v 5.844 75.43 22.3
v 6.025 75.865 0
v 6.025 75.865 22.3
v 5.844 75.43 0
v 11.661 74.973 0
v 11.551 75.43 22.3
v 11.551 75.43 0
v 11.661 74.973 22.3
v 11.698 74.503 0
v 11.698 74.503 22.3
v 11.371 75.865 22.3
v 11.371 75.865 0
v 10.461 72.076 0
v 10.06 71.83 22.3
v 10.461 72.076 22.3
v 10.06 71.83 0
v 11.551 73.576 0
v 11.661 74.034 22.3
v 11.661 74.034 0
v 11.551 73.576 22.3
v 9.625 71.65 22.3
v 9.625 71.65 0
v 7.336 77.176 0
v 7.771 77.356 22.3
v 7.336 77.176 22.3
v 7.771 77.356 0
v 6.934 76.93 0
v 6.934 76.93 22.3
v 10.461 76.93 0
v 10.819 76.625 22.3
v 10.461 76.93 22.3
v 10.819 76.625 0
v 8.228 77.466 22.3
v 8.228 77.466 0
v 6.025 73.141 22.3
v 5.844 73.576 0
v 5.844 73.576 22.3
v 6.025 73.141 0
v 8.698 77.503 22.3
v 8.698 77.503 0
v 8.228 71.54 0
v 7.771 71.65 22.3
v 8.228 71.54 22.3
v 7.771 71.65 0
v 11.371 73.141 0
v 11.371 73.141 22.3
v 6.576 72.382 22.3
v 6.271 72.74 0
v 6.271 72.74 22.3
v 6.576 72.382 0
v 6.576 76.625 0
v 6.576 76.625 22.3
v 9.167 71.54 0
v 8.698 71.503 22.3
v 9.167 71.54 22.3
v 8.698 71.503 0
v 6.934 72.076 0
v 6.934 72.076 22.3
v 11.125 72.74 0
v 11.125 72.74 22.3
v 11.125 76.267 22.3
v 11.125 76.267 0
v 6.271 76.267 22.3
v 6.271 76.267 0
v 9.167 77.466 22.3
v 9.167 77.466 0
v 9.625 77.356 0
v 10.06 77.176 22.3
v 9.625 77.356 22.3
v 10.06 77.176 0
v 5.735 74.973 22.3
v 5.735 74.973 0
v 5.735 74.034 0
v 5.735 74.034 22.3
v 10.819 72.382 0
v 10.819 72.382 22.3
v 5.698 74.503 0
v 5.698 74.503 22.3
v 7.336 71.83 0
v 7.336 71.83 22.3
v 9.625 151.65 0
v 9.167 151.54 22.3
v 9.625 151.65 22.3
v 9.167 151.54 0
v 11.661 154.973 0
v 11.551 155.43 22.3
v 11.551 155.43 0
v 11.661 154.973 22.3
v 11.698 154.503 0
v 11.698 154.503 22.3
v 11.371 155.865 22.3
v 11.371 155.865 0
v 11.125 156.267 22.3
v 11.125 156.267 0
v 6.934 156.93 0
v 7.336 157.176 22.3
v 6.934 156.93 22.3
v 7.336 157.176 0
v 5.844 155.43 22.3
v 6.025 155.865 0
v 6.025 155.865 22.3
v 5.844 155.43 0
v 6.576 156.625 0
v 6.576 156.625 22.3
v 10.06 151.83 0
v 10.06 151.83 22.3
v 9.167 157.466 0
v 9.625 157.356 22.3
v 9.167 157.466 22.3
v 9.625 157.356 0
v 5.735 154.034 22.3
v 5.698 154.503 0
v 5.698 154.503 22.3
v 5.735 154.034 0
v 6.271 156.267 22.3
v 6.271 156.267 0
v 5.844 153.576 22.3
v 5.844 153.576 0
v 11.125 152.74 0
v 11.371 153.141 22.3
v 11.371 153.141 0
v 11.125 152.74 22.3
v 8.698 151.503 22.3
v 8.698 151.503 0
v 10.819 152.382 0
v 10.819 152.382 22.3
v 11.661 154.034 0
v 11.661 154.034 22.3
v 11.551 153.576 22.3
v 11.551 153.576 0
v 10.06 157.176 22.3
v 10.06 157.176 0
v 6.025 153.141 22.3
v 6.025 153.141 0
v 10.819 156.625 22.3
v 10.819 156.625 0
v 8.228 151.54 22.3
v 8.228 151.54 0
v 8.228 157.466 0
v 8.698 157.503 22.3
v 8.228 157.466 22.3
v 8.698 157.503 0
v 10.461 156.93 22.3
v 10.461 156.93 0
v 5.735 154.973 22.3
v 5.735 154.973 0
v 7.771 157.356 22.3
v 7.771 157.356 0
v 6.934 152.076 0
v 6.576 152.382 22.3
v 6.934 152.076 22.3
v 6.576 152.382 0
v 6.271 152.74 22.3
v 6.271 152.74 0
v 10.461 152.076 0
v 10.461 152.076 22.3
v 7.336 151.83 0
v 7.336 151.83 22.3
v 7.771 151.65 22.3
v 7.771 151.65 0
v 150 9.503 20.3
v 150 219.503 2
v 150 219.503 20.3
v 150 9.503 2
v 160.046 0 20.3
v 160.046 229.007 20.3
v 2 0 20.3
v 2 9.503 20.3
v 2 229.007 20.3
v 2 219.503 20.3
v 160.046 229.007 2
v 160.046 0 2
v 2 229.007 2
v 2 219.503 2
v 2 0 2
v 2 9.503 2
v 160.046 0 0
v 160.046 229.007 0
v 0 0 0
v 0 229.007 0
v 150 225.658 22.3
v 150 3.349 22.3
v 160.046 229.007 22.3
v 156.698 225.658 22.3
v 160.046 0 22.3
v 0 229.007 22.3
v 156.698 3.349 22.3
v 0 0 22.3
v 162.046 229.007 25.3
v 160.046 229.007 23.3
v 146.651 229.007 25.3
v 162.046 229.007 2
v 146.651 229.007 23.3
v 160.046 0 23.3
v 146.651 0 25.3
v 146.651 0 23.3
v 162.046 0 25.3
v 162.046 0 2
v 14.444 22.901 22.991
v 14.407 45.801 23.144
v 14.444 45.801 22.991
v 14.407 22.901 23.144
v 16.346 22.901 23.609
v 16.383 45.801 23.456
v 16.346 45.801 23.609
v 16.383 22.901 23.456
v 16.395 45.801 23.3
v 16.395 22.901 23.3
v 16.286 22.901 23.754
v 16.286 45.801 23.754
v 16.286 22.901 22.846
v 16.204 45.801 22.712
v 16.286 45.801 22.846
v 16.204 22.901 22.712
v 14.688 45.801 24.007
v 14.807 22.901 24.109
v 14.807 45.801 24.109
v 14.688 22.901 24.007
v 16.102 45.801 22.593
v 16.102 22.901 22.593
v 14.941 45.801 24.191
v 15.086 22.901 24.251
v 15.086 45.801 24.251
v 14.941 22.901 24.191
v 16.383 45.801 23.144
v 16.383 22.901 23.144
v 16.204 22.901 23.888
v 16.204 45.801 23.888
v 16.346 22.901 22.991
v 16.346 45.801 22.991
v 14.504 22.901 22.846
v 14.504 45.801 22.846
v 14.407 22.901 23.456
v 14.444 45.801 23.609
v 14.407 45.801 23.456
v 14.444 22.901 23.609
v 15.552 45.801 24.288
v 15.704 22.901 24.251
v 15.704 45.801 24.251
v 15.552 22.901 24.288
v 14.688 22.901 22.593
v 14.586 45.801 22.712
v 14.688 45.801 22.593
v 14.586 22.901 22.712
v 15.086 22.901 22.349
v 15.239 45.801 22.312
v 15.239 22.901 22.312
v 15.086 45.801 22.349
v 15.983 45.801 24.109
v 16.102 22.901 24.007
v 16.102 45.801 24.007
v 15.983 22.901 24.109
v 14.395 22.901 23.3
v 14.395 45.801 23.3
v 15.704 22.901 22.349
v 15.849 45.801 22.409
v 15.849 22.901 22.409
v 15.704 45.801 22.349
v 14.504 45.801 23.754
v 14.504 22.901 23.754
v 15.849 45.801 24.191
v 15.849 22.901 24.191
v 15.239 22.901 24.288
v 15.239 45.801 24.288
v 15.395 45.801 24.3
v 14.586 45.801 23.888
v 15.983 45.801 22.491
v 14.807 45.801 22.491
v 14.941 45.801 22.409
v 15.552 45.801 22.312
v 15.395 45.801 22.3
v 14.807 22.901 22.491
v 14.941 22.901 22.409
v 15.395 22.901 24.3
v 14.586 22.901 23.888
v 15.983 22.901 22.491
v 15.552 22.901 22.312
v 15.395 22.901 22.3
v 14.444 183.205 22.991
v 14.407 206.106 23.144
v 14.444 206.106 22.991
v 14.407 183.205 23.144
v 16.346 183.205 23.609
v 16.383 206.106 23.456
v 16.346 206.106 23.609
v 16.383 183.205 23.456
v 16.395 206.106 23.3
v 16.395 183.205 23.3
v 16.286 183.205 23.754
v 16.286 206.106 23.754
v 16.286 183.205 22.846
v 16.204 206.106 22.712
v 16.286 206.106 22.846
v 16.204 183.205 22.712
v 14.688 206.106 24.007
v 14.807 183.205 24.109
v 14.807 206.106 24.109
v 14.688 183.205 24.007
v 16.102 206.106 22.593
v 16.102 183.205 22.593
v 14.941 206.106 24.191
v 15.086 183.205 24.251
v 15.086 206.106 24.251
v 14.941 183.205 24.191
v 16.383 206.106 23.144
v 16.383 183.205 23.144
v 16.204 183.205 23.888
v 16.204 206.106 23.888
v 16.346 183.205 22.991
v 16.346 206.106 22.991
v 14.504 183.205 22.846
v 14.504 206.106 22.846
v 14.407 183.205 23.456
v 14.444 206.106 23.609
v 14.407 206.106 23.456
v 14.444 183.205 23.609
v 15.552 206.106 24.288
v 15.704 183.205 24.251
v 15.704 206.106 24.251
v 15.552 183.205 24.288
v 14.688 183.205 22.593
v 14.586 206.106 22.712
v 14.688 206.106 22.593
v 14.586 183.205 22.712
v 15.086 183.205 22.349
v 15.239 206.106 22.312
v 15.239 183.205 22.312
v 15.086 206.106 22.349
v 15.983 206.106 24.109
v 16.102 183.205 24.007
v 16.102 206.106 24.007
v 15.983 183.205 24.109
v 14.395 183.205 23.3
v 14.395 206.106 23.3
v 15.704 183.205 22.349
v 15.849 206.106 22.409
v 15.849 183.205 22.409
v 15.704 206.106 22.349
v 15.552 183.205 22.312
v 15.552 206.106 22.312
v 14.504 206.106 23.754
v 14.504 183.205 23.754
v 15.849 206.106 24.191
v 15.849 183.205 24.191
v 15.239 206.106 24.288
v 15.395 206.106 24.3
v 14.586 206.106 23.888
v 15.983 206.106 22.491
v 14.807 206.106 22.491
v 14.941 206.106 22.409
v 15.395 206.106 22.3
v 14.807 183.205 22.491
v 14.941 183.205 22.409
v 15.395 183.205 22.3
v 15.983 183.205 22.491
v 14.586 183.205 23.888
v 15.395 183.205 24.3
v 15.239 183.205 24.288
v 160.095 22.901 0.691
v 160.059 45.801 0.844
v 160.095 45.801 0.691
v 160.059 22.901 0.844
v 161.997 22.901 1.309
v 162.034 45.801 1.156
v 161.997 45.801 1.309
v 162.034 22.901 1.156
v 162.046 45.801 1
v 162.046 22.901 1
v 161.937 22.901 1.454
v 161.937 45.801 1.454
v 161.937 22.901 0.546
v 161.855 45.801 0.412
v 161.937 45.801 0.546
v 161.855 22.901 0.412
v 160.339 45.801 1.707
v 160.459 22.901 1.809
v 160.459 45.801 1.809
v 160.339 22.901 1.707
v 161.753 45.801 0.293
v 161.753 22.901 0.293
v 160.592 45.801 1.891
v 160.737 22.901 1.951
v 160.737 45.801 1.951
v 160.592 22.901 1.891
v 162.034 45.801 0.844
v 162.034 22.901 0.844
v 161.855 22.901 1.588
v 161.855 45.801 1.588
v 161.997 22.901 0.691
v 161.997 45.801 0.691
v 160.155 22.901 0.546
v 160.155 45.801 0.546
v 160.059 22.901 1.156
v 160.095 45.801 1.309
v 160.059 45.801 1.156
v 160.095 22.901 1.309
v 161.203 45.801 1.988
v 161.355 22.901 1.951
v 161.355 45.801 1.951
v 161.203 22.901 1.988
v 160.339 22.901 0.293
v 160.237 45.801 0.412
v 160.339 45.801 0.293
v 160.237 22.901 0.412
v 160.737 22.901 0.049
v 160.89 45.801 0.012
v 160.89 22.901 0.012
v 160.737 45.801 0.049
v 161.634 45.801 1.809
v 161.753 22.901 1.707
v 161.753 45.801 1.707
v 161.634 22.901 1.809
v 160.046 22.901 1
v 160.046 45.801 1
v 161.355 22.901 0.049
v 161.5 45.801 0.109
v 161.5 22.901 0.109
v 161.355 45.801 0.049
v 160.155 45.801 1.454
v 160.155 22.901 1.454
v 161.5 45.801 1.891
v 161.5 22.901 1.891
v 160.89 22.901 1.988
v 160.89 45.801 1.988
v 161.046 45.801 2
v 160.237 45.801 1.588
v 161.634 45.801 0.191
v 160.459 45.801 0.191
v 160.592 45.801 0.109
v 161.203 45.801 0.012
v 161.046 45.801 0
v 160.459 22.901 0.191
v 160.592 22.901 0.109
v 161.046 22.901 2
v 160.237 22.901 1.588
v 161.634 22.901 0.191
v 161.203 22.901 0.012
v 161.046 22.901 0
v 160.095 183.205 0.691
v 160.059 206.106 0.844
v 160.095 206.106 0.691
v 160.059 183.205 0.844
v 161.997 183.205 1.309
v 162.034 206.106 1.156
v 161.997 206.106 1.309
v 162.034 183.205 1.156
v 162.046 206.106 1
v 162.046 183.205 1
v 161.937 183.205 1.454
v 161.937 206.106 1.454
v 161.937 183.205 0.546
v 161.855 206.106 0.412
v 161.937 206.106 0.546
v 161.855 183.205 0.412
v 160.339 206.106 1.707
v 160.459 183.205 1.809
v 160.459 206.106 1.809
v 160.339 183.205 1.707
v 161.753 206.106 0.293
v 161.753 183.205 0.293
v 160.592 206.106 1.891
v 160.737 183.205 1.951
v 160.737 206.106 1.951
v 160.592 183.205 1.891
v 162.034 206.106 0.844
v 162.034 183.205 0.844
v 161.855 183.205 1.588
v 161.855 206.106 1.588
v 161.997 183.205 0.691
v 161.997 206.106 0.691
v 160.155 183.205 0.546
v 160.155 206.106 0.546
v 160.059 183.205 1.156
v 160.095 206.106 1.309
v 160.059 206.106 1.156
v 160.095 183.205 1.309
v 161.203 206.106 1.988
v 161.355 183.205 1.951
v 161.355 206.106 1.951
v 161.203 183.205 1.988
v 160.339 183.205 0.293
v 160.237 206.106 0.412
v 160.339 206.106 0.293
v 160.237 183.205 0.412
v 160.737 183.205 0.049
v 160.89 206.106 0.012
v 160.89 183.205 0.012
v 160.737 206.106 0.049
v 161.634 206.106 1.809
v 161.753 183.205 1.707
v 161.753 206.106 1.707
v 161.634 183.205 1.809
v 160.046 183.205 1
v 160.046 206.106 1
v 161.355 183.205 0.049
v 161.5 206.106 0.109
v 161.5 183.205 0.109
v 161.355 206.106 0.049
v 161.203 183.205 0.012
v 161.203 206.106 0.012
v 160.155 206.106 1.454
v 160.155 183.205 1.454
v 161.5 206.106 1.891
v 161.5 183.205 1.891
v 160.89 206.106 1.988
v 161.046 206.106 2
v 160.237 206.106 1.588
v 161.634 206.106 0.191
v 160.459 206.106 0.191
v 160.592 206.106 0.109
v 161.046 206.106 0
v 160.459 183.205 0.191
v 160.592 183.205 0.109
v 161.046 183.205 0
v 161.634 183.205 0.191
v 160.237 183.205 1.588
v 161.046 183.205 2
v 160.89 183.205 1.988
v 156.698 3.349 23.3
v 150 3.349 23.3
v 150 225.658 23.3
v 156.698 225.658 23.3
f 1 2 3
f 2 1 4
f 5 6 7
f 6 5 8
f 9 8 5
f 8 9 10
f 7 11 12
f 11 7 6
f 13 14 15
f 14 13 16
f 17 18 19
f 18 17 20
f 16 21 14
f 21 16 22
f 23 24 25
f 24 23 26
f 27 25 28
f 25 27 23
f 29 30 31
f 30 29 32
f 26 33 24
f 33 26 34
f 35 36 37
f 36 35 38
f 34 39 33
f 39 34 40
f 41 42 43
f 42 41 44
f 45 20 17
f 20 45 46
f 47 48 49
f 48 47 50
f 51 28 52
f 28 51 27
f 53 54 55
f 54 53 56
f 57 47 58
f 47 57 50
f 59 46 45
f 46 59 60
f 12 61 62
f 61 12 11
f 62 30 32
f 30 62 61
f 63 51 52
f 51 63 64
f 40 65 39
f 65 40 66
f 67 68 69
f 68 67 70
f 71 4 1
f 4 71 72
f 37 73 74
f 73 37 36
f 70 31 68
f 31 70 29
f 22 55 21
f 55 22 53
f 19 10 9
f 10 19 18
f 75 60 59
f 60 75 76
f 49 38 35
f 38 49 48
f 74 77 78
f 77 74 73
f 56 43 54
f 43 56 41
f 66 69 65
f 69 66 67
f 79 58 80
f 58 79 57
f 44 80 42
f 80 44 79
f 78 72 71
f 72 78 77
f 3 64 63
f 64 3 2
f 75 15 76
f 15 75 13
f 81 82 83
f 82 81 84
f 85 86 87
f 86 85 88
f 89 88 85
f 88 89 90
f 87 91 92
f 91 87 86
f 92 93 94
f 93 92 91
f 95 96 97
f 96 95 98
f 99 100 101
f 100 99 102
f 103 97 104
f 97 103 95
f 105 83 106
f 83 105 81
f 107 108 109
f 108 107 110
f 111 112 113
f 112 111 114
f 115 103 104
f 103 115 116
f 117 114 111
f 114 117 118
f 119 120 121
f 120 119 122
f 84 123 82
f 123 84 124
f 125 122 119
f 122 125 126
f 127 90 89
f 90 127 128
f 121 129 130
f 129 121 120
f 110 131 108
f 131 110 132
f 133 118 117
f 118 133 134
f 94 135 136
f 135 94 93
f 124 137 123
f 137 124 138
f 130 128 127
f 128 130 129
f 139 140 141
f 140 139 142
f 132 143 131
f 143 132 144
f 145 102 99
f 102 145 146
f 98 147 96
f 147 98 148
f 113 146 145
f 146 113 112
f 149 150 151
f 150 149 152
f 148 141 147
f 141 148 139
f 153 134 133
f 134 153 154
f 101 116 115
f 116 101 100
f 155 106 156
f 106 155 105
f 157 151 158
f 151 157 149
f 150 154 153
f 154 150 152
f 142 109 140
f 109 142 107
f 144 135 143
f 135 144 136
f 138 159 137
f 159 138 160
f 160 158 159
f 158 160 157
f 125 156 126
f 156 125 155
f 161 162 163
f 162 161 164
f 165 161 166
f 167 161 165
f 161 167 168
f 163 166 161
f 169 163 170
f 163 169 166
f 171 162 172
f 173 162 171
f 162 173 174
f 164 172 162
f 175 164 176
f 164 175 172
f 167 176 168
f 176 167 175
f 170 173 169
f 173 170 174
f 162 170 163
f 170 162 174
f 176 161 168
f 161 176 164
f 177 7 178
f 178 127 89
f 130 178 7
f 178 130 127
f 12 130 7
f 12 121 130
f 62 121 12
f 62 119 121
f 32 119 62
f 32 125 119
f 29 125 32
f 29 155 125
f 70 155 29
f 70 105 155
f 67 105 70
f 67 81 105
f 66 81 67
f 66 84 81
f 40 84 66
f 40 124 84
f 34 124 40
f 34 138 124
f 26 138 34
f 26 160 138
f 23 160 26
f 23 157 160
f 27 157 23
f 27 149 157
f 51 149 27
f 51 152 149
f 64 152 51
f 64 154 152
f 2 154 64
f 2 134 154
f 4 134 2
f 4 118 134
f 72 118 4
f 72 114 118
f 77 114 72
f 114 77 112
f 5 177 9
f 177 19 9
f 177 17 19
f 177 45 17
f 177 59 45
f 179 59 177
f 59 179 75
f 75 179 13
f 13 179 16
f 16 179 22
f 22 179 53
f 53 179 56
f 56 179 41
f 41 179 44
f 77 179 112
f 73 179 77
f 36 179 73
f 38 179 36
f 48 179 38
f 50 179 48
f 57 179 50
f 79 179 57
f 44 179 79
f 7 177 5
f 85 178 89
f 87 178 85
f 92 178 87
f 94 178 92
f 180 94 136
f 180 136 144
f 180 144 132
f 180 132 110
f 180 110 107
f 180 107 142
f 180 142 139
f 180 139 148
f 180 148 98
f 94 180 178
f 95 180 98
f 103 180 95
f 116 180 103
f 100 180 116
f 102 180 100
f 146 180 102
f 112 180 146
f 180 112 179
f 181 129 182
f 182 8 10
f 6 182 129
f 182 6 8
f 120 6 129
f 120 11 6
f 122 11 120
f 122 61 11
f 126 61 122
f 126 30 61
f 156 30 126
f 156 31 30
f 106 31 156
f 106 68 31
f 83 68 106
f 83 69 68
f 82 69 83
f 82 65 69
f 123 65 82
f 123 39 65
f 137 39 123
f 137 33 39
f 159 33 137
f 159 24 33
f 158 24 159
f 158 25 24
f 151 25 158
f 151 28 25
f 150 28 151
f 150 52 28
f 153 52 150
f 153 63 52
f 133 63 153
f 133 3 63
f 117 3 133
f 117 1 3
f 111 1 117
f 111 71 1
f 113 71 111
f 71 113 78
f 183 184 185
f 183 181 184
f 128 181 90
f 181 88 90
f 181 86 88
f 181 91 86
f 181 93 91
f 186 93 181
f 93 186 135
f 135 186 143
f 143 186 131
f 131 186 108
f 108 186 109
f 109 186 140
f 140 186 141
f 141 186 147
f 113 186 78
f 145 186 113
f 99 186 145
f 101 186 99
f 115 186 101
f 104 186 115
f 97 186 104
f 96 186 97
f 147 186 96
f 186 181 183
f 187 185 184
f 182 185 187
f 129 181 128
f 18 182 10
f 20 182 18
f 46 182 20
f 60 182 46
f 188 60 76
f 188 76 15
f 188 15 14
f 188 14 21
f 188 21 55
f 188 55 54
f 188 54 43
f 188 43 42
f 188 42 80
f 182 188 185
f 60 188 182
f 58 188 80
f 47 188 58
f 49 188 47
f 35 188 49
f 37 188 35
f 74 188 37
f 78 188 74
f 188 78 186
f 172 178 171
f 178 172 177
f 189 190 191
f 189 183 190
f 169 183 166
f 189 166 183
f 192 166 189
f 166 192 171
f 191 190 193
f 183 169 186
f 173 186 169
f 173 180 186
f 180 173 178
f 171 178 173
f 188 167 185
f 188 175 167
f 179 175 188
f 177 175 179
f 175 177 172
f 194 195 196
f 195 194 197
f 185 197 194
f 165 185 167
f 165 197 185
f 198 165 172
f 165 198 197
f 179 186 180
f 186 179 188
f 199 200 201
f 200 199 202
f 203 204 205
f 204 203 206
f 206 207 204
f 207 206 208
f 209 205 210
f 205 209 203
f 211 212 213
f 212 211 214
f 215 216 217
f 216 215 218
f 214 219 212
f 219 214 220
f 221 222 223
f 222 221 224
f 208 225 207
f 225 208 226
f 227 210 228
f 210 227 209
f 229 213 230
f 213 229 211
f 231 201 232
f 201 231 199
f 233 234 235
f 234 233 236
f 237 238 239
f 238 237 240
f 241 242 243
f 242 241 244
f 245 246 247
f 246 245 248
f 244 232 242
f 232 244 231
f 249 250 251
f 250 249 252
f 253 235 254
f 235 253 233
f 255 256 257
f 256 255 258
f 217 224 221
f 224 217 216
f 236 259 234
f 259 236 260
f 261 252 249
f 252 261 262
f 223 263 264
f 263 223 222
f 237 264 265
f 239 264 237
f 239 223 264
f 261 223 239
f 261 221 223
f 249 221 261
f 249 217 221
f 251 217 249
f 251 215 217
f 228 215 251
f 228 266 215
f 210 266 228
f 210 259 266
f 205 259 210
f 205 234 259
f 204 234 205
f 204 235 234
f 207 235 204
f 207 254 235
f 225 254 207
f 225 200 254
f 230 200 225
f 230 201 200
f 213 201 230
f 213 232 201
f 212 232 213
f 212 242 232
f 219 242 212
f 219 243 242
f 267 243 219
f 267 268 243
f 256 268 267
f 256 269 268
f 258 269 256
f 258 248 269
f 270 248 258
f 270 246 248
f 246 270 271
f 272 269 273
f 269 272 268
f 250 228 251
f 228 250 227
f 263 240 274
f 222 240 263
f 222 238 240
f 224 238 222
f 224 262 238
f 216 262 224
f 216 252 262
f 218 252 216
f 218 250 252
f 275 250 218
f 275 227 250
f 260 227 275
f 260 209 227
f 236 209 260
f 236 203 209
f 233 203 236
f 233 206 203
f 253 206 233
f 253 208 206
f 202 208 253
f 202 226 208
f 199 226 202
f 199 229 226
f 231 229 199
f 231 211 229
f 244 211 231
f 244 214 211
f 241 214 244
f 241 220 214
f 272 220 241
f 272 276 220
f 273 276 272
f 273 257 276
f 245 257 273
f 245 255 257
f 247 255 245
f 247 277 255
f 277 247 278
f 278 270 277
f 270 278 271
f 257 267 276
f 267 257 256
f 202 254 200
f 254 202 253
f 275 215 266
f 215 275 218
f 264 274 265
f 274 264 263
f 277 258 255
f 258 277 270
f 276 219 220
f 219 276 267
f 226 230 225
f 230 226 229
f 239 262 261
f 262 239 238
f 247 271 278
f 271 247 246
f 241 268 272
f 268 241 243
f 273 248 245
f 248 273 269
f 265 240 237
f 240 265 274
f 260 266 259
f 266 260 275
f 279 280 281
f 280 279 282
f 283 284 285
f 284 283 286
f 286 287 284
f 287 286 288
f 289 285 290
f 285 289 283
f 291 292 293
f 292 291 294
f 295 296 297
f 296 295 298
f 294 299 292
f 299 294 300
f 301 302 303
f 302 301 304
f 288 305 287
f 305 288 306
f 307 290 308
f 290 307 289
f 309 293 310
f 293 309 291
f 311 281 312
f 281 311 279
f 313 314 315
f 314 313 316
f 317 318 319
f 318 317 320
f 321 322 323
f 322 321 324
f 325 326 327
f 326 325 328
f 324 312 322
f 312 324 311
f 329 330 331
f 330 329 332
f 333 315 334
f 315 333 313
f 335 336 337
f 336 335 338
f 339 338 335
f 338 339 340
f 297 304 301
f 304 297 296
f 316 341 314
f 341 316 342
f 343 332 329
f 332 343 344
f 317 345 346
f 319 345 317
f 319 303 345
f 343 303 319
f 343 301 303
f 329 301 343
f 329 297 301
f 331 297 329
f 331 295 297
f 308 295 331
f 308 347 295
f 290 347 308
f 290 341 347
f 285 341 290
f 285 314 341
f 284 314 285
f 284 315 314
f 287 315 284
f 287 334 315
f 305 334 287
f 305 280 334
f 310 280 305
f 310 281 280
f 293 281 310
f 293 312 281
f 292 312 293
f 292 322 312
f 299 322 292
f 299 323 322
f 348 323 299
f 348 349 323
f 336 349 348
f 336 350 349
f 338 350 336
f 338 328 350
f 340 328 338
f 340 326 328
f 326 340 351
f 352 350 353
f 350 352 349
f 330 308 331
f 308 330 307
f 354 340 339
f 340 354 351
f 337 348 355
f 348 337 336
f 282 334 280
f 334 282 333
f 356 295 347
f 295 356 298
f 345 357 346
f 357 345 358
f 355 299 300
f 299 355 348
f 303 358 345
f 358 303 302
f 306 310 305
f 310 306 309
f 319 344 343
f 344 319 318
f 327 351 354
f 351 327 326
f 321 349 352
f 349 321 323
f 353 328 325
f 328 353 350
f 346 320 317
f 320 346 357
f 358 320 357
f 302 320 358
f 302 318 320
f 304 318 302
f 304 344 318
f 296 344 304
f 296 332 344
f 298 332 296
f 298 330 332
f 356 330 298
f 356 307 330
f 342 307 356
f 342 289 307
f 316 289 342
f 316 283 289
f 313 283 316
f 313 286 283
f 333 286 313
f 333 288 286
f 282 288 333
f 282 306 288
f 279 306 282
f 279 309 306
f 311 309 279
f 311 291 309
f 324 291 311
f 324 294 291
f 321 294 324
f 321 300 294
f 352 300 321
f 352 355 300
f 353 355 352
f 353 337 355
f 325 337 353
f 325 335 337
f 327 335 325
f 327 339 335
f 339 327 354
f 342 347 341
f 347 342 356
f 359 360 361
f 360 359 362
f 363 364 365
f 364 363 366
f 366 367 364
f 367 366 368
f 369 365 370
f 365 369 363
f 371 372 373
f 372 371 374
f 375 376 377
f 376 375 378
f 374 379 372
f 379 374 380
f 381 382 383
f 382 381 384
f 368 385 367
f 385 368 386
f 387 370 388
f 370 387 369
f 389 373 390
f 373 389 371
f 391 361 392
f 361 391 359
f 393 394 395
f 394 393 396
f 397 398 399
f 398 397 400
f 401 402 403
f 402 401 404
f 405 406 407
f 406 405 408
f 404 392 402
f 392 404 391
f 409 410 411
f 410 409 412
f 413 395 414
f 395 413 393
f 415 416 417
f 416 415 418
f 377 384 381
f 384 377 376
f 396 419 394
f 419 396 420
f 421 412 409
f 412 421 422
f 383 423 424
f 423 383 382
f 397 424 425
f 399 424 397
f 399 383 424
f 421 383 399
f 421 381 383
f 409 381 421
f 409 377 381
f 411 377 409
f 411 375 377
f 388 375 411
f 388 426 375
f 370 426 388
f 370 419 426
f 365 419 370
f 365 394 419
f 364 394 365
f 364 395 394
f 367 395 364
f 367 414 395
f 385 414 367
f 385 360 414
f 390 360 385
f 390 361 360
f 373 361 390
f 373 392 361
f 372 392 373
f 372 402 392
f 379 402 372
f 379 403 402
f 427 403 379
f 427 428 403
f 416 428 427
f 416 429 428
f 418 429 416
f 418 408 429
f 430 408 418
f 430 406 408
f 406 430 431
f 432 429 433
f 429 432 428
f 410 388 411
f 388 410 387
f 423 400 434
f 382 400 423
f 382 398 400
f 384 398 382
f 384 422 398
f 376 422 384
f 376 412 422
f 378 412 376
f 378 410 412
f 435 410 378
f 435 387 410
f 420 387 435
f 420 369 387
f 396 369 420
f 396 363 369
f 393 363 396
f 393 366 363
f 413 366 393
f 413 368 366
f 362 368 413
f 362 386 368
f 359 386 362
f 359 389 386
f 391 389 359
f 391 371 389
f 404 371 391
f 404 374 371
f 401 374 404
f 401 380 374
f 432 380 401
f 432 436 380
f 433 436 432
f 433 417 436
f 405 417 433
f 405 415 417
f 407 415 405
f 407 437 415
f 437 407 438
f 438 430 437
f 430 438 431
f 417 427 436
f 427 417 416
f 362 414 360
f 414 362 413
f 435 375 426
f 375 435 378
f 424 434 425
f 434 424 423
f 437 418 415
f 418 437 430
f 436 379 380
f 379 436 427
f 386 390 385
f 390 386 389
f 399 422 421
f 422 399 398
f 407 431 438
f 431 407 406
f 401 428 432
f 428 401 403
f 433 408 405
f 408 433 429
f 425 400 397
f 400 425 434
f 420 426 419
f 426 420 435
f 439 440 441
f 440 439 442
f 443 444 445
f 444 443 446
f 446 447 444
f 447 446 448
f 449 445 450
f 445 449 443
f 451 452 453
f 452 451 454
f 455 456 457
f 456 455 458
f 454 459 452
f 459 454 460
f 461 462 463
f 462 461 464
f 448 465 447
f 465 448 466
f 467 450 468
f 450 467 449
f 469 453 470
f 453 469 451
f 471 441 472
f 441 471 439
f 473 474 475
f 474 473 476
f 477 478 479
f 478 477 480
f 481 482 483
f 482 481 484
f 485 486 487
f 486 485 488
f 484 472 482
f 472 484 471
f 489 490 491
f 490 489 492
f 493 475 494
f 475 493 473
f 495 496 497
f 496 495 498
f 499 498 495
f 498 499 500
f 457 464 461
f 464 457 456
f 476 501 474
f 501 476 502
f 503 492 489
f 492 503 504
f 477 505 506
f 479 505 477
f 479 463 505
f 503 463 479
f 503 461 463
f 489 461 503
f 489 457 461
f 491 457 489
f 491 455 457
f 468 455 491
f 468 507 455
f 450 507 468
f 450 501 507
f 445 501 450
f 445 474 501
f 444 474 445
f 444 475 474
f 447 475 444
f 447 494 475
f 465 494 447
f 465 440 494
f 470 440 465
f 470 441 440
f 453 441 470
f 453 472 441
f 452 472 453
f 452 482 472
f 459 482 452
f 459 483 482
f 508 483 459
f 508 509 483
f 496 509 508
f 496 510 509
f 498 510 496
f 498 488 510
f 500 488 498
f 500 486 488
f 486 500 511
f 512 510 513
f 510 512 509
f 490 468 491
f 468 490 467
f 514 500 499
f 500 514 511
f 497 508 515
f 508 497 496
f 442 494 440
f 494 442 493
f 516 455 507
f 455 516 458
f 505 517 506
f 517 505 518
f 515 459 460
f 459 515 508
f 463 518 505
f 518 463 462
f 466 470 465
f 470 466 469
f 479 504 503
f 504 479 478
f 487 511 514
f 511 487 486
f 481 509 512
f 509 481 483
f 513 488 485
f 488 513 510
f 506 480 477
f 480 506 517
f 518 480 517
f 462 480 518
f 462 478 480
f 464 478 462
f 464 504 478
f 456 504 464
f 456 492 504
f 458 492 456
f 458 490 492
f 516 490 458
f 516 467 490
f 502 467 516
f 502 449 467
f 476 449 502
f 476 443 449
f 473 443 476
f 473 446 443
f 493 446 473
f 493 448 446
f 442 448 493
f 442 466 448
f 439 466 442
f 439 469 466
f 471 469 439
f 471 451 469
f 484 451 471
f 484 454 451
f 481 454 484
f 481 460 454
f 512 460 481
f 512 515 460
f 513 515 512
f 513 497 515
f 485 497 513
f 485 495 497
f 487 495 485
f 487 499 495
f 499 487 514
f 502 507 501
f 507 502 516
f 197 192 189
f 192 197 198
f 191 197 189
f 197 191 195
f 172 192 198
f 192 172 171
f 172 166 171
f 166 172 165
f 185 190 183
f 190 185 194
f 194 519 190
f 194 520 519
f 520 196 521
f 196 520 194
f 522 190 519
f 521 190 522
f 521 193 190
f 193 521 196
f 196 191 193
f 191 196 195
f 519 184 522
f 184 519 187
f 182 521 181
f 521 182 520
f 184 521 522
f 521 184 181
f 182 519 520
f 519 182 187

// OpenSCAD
// Configuration (all sizes in millimeters)
metal_thickness = 2;
magnet_thickness = 1;

// A5 paper default
paper_width = 148;
paper_height = 210;
paper_sheet_thickness = 0.1;
paper_sheets = ceil(365 / 2); // One page per day default

paper_hole_positions = [0, 80];
paper_hole_center = 40; // max(paper_hole_positions) / 2
paper_hole_radius = 3;

facets = 40; // Number of facets in circular objects
explode = false; // Set to true to see parts separately
// Configuration end

// Calculate Cn size based on arithmetic progression
// https://secure.wikimedia.org/wikipedia/en/wiki/ISO_216
outer_width = paper_width * pow(2, 1.0 / 8);
outer_height = paper_height * pow(2, 1.0 / 8);

paper_thickness = paper_sheets * paper_sheet_thickness;

back_thickness = 2 * metal_thickness + paper_thickness;

margin_width = (outer_width - paper_width) / 2;
margin_height = (outer_height - paper_height) / 2;

overhang_width = margin_width * 2;

// There's no need for left margin on the back and front
back_width = outer_width - margin_width / 2;

// The front is to the right of the overhang from the back
front_width = back_width - overhang_width;

magnet_margin = overhang_width / 4;
magnet_width = overhang_width - 2 * magnet_margin;
magnet_height = outer_height - 2 * magnet_margin;

hinge_height = outer_height / 10;
hinge_radius = metal_thickness / 2;

// Some useful information for constructing by hand
echo (str(
	"Book outer dimensions: ",
	"width=", outer_width, ", ",
	"height=", outer_height, ", ",
	"thickness=", back_thickness + 2*magnet_thickness,
	" (not counting hinges)"));

echo (str(
	"Center length of the back plate sections: ",
	back_width + metal_thickness / 2, ", ",
	back_thickness - metal_thickness, ", ",
	overhang_width + metal_thickness / 2));
echo (str(
	"Total length of the back plate sections: ",
	back_width + metal_thickness / 2 +
	back_thickness - metal_thickness +
	overhang_width + metal_thickness / 2));

echo (str(
	"Width of the front plate: ",
	front_width));

echo (str(
	"Center length of the clasp sections: ",
	back_thickness + magnet_thickness - metal_thickness / 2, ", ",
	overhang_width - metal_thickness / 2));

echo (str(
	"Total length of the clasp sections: ",
	back_thickness + magnet_thickness - metal_thickness / 2 +
	overhang_width - metal_thickness / 2));

module paper() {
	difference() {
		translate([metal_thickness, margin_height, metal_thickness]) {
			cube(size = [paper_width, paper_height, paper_thickness]);
		}
		binding_holes();
	}
}

module back_cover() {
	translate([metal_thickness, 0, 0]) {
		cube(size = [back_width, outer_height, metal_thickness]);
	}
}

module back_side() {
	cube(size = [metal_thickness, outer_height, back_thickness]);
}

module back_overhang() {
	translate([metal_thickness, 0, paper_thickness + metal_thickness]) {
		cube(size = [overhang_width, outer_height, metal_thickness]);
	}
}

module binding_hole() {
	cylinder(h = back_thickness, r=paper_hole_radius, $fn=facets);
}

module binding_holes() {
	translate([metal_thickness + overhang_width / 2, outer_height / 2 - paper_hole_center, 0]) {
		for (position = paper_hole_positions) {
			translate([0, position, 0]) {
				binding_hole();
			}
			echo (str(
				"Binding hole center distance from bottom: ",
				outer_height / 2 - paper_hole_center + position + paper_hole_radius));
		}
	}
}

module back() {
	difference() {
		union() {
			back_cover();
			back_side();
			back_overhang();
		}
		binding_holes();
	}
}

module hinge() {
	rotate([90, 0, 0]) {
		cylinder(h = hinge_height, r=hinge_radius, $fn=facets);
	}
}
module top_hinge() {
	translate([0, 2*hinge_height, 0]) {
		hinge();
	}
}
module bottom_hinge() {
	translate([0, outer_height - hinge_height, 0]) {
		hinge();
	}
}

module hinges() {
	top_hinge();
	bottom_hinge();
}

module front_hinges() {
	translate([metal_thickness + overhang_width, 0, paper_thickness + 2 * metal_thickness + hinge_radius]) {
		hinges();
	}
}

module front() {
	translate([metal_thickness + overhang_width, 0, paper_thickness + metal_thickness]) {
		cube(size = [front_width, outer_height, metal_thickness]);
	}
}

module clasp_hinges() {
	translate([metal_thickness + back_width + hinge_radius, 0, metal_thickness - hinge_radius]) {
		hinges();
	}
}

module clasp_side() {
	translate([metal_thickness + back_width, 0, metal_thickness]) {
		cube(size = [metal_thickness, outer_height, back_thickness + magnet_thickness]);
	}
}

module clasp_overhang() {
	translate([metal_thickness + back_width - overhang_width, 0, paper_thickness + 2 * metal_thickness + magnet_thickness]) {
		cube(size = [overhang_width, outer_height, metal_thickness]);
	}
}

module clasp_magnet() {
	translate([metal_thickness + back_width - overhang_width + magnet_margin, magnet_margin, paper_thickness + 2 * metal_thickness]) {
		cube(size = [magnet_width, magnet_height, magnet_thickness]);
	}
}

module clasp() {
	union() {
		clasp_side();
		clasp_overhang();
	}
}

module book(explosion) {
	translate([0, 0, 0 * explosion]) {
		# paper();
	}
	translate([0, 0, 1 * explosion]) {
		back();
	}
	translate([0, 0, 2 * explosion]) {
		front_hinges();
	}
	translate([0, 0, 3 * explosion]) {
		front();
	}
	translate([0, 0, 4 * explosion]) {
		clasp_hinges();
	}
	translate([0, 0, 5 * explosion]) {
		clasp_magnet();
	}
	translate([0, 0, 6 * explosion]) {
		clasp();
	}
}

if (explode)
	// Must be bigger than the biggest distance in imploded modus to be absolutely sure that it won't still clash
	assign(explosion=1.1 * (back_thickness + 2 * hinge_radius)) book(explosion);
else
	book();
